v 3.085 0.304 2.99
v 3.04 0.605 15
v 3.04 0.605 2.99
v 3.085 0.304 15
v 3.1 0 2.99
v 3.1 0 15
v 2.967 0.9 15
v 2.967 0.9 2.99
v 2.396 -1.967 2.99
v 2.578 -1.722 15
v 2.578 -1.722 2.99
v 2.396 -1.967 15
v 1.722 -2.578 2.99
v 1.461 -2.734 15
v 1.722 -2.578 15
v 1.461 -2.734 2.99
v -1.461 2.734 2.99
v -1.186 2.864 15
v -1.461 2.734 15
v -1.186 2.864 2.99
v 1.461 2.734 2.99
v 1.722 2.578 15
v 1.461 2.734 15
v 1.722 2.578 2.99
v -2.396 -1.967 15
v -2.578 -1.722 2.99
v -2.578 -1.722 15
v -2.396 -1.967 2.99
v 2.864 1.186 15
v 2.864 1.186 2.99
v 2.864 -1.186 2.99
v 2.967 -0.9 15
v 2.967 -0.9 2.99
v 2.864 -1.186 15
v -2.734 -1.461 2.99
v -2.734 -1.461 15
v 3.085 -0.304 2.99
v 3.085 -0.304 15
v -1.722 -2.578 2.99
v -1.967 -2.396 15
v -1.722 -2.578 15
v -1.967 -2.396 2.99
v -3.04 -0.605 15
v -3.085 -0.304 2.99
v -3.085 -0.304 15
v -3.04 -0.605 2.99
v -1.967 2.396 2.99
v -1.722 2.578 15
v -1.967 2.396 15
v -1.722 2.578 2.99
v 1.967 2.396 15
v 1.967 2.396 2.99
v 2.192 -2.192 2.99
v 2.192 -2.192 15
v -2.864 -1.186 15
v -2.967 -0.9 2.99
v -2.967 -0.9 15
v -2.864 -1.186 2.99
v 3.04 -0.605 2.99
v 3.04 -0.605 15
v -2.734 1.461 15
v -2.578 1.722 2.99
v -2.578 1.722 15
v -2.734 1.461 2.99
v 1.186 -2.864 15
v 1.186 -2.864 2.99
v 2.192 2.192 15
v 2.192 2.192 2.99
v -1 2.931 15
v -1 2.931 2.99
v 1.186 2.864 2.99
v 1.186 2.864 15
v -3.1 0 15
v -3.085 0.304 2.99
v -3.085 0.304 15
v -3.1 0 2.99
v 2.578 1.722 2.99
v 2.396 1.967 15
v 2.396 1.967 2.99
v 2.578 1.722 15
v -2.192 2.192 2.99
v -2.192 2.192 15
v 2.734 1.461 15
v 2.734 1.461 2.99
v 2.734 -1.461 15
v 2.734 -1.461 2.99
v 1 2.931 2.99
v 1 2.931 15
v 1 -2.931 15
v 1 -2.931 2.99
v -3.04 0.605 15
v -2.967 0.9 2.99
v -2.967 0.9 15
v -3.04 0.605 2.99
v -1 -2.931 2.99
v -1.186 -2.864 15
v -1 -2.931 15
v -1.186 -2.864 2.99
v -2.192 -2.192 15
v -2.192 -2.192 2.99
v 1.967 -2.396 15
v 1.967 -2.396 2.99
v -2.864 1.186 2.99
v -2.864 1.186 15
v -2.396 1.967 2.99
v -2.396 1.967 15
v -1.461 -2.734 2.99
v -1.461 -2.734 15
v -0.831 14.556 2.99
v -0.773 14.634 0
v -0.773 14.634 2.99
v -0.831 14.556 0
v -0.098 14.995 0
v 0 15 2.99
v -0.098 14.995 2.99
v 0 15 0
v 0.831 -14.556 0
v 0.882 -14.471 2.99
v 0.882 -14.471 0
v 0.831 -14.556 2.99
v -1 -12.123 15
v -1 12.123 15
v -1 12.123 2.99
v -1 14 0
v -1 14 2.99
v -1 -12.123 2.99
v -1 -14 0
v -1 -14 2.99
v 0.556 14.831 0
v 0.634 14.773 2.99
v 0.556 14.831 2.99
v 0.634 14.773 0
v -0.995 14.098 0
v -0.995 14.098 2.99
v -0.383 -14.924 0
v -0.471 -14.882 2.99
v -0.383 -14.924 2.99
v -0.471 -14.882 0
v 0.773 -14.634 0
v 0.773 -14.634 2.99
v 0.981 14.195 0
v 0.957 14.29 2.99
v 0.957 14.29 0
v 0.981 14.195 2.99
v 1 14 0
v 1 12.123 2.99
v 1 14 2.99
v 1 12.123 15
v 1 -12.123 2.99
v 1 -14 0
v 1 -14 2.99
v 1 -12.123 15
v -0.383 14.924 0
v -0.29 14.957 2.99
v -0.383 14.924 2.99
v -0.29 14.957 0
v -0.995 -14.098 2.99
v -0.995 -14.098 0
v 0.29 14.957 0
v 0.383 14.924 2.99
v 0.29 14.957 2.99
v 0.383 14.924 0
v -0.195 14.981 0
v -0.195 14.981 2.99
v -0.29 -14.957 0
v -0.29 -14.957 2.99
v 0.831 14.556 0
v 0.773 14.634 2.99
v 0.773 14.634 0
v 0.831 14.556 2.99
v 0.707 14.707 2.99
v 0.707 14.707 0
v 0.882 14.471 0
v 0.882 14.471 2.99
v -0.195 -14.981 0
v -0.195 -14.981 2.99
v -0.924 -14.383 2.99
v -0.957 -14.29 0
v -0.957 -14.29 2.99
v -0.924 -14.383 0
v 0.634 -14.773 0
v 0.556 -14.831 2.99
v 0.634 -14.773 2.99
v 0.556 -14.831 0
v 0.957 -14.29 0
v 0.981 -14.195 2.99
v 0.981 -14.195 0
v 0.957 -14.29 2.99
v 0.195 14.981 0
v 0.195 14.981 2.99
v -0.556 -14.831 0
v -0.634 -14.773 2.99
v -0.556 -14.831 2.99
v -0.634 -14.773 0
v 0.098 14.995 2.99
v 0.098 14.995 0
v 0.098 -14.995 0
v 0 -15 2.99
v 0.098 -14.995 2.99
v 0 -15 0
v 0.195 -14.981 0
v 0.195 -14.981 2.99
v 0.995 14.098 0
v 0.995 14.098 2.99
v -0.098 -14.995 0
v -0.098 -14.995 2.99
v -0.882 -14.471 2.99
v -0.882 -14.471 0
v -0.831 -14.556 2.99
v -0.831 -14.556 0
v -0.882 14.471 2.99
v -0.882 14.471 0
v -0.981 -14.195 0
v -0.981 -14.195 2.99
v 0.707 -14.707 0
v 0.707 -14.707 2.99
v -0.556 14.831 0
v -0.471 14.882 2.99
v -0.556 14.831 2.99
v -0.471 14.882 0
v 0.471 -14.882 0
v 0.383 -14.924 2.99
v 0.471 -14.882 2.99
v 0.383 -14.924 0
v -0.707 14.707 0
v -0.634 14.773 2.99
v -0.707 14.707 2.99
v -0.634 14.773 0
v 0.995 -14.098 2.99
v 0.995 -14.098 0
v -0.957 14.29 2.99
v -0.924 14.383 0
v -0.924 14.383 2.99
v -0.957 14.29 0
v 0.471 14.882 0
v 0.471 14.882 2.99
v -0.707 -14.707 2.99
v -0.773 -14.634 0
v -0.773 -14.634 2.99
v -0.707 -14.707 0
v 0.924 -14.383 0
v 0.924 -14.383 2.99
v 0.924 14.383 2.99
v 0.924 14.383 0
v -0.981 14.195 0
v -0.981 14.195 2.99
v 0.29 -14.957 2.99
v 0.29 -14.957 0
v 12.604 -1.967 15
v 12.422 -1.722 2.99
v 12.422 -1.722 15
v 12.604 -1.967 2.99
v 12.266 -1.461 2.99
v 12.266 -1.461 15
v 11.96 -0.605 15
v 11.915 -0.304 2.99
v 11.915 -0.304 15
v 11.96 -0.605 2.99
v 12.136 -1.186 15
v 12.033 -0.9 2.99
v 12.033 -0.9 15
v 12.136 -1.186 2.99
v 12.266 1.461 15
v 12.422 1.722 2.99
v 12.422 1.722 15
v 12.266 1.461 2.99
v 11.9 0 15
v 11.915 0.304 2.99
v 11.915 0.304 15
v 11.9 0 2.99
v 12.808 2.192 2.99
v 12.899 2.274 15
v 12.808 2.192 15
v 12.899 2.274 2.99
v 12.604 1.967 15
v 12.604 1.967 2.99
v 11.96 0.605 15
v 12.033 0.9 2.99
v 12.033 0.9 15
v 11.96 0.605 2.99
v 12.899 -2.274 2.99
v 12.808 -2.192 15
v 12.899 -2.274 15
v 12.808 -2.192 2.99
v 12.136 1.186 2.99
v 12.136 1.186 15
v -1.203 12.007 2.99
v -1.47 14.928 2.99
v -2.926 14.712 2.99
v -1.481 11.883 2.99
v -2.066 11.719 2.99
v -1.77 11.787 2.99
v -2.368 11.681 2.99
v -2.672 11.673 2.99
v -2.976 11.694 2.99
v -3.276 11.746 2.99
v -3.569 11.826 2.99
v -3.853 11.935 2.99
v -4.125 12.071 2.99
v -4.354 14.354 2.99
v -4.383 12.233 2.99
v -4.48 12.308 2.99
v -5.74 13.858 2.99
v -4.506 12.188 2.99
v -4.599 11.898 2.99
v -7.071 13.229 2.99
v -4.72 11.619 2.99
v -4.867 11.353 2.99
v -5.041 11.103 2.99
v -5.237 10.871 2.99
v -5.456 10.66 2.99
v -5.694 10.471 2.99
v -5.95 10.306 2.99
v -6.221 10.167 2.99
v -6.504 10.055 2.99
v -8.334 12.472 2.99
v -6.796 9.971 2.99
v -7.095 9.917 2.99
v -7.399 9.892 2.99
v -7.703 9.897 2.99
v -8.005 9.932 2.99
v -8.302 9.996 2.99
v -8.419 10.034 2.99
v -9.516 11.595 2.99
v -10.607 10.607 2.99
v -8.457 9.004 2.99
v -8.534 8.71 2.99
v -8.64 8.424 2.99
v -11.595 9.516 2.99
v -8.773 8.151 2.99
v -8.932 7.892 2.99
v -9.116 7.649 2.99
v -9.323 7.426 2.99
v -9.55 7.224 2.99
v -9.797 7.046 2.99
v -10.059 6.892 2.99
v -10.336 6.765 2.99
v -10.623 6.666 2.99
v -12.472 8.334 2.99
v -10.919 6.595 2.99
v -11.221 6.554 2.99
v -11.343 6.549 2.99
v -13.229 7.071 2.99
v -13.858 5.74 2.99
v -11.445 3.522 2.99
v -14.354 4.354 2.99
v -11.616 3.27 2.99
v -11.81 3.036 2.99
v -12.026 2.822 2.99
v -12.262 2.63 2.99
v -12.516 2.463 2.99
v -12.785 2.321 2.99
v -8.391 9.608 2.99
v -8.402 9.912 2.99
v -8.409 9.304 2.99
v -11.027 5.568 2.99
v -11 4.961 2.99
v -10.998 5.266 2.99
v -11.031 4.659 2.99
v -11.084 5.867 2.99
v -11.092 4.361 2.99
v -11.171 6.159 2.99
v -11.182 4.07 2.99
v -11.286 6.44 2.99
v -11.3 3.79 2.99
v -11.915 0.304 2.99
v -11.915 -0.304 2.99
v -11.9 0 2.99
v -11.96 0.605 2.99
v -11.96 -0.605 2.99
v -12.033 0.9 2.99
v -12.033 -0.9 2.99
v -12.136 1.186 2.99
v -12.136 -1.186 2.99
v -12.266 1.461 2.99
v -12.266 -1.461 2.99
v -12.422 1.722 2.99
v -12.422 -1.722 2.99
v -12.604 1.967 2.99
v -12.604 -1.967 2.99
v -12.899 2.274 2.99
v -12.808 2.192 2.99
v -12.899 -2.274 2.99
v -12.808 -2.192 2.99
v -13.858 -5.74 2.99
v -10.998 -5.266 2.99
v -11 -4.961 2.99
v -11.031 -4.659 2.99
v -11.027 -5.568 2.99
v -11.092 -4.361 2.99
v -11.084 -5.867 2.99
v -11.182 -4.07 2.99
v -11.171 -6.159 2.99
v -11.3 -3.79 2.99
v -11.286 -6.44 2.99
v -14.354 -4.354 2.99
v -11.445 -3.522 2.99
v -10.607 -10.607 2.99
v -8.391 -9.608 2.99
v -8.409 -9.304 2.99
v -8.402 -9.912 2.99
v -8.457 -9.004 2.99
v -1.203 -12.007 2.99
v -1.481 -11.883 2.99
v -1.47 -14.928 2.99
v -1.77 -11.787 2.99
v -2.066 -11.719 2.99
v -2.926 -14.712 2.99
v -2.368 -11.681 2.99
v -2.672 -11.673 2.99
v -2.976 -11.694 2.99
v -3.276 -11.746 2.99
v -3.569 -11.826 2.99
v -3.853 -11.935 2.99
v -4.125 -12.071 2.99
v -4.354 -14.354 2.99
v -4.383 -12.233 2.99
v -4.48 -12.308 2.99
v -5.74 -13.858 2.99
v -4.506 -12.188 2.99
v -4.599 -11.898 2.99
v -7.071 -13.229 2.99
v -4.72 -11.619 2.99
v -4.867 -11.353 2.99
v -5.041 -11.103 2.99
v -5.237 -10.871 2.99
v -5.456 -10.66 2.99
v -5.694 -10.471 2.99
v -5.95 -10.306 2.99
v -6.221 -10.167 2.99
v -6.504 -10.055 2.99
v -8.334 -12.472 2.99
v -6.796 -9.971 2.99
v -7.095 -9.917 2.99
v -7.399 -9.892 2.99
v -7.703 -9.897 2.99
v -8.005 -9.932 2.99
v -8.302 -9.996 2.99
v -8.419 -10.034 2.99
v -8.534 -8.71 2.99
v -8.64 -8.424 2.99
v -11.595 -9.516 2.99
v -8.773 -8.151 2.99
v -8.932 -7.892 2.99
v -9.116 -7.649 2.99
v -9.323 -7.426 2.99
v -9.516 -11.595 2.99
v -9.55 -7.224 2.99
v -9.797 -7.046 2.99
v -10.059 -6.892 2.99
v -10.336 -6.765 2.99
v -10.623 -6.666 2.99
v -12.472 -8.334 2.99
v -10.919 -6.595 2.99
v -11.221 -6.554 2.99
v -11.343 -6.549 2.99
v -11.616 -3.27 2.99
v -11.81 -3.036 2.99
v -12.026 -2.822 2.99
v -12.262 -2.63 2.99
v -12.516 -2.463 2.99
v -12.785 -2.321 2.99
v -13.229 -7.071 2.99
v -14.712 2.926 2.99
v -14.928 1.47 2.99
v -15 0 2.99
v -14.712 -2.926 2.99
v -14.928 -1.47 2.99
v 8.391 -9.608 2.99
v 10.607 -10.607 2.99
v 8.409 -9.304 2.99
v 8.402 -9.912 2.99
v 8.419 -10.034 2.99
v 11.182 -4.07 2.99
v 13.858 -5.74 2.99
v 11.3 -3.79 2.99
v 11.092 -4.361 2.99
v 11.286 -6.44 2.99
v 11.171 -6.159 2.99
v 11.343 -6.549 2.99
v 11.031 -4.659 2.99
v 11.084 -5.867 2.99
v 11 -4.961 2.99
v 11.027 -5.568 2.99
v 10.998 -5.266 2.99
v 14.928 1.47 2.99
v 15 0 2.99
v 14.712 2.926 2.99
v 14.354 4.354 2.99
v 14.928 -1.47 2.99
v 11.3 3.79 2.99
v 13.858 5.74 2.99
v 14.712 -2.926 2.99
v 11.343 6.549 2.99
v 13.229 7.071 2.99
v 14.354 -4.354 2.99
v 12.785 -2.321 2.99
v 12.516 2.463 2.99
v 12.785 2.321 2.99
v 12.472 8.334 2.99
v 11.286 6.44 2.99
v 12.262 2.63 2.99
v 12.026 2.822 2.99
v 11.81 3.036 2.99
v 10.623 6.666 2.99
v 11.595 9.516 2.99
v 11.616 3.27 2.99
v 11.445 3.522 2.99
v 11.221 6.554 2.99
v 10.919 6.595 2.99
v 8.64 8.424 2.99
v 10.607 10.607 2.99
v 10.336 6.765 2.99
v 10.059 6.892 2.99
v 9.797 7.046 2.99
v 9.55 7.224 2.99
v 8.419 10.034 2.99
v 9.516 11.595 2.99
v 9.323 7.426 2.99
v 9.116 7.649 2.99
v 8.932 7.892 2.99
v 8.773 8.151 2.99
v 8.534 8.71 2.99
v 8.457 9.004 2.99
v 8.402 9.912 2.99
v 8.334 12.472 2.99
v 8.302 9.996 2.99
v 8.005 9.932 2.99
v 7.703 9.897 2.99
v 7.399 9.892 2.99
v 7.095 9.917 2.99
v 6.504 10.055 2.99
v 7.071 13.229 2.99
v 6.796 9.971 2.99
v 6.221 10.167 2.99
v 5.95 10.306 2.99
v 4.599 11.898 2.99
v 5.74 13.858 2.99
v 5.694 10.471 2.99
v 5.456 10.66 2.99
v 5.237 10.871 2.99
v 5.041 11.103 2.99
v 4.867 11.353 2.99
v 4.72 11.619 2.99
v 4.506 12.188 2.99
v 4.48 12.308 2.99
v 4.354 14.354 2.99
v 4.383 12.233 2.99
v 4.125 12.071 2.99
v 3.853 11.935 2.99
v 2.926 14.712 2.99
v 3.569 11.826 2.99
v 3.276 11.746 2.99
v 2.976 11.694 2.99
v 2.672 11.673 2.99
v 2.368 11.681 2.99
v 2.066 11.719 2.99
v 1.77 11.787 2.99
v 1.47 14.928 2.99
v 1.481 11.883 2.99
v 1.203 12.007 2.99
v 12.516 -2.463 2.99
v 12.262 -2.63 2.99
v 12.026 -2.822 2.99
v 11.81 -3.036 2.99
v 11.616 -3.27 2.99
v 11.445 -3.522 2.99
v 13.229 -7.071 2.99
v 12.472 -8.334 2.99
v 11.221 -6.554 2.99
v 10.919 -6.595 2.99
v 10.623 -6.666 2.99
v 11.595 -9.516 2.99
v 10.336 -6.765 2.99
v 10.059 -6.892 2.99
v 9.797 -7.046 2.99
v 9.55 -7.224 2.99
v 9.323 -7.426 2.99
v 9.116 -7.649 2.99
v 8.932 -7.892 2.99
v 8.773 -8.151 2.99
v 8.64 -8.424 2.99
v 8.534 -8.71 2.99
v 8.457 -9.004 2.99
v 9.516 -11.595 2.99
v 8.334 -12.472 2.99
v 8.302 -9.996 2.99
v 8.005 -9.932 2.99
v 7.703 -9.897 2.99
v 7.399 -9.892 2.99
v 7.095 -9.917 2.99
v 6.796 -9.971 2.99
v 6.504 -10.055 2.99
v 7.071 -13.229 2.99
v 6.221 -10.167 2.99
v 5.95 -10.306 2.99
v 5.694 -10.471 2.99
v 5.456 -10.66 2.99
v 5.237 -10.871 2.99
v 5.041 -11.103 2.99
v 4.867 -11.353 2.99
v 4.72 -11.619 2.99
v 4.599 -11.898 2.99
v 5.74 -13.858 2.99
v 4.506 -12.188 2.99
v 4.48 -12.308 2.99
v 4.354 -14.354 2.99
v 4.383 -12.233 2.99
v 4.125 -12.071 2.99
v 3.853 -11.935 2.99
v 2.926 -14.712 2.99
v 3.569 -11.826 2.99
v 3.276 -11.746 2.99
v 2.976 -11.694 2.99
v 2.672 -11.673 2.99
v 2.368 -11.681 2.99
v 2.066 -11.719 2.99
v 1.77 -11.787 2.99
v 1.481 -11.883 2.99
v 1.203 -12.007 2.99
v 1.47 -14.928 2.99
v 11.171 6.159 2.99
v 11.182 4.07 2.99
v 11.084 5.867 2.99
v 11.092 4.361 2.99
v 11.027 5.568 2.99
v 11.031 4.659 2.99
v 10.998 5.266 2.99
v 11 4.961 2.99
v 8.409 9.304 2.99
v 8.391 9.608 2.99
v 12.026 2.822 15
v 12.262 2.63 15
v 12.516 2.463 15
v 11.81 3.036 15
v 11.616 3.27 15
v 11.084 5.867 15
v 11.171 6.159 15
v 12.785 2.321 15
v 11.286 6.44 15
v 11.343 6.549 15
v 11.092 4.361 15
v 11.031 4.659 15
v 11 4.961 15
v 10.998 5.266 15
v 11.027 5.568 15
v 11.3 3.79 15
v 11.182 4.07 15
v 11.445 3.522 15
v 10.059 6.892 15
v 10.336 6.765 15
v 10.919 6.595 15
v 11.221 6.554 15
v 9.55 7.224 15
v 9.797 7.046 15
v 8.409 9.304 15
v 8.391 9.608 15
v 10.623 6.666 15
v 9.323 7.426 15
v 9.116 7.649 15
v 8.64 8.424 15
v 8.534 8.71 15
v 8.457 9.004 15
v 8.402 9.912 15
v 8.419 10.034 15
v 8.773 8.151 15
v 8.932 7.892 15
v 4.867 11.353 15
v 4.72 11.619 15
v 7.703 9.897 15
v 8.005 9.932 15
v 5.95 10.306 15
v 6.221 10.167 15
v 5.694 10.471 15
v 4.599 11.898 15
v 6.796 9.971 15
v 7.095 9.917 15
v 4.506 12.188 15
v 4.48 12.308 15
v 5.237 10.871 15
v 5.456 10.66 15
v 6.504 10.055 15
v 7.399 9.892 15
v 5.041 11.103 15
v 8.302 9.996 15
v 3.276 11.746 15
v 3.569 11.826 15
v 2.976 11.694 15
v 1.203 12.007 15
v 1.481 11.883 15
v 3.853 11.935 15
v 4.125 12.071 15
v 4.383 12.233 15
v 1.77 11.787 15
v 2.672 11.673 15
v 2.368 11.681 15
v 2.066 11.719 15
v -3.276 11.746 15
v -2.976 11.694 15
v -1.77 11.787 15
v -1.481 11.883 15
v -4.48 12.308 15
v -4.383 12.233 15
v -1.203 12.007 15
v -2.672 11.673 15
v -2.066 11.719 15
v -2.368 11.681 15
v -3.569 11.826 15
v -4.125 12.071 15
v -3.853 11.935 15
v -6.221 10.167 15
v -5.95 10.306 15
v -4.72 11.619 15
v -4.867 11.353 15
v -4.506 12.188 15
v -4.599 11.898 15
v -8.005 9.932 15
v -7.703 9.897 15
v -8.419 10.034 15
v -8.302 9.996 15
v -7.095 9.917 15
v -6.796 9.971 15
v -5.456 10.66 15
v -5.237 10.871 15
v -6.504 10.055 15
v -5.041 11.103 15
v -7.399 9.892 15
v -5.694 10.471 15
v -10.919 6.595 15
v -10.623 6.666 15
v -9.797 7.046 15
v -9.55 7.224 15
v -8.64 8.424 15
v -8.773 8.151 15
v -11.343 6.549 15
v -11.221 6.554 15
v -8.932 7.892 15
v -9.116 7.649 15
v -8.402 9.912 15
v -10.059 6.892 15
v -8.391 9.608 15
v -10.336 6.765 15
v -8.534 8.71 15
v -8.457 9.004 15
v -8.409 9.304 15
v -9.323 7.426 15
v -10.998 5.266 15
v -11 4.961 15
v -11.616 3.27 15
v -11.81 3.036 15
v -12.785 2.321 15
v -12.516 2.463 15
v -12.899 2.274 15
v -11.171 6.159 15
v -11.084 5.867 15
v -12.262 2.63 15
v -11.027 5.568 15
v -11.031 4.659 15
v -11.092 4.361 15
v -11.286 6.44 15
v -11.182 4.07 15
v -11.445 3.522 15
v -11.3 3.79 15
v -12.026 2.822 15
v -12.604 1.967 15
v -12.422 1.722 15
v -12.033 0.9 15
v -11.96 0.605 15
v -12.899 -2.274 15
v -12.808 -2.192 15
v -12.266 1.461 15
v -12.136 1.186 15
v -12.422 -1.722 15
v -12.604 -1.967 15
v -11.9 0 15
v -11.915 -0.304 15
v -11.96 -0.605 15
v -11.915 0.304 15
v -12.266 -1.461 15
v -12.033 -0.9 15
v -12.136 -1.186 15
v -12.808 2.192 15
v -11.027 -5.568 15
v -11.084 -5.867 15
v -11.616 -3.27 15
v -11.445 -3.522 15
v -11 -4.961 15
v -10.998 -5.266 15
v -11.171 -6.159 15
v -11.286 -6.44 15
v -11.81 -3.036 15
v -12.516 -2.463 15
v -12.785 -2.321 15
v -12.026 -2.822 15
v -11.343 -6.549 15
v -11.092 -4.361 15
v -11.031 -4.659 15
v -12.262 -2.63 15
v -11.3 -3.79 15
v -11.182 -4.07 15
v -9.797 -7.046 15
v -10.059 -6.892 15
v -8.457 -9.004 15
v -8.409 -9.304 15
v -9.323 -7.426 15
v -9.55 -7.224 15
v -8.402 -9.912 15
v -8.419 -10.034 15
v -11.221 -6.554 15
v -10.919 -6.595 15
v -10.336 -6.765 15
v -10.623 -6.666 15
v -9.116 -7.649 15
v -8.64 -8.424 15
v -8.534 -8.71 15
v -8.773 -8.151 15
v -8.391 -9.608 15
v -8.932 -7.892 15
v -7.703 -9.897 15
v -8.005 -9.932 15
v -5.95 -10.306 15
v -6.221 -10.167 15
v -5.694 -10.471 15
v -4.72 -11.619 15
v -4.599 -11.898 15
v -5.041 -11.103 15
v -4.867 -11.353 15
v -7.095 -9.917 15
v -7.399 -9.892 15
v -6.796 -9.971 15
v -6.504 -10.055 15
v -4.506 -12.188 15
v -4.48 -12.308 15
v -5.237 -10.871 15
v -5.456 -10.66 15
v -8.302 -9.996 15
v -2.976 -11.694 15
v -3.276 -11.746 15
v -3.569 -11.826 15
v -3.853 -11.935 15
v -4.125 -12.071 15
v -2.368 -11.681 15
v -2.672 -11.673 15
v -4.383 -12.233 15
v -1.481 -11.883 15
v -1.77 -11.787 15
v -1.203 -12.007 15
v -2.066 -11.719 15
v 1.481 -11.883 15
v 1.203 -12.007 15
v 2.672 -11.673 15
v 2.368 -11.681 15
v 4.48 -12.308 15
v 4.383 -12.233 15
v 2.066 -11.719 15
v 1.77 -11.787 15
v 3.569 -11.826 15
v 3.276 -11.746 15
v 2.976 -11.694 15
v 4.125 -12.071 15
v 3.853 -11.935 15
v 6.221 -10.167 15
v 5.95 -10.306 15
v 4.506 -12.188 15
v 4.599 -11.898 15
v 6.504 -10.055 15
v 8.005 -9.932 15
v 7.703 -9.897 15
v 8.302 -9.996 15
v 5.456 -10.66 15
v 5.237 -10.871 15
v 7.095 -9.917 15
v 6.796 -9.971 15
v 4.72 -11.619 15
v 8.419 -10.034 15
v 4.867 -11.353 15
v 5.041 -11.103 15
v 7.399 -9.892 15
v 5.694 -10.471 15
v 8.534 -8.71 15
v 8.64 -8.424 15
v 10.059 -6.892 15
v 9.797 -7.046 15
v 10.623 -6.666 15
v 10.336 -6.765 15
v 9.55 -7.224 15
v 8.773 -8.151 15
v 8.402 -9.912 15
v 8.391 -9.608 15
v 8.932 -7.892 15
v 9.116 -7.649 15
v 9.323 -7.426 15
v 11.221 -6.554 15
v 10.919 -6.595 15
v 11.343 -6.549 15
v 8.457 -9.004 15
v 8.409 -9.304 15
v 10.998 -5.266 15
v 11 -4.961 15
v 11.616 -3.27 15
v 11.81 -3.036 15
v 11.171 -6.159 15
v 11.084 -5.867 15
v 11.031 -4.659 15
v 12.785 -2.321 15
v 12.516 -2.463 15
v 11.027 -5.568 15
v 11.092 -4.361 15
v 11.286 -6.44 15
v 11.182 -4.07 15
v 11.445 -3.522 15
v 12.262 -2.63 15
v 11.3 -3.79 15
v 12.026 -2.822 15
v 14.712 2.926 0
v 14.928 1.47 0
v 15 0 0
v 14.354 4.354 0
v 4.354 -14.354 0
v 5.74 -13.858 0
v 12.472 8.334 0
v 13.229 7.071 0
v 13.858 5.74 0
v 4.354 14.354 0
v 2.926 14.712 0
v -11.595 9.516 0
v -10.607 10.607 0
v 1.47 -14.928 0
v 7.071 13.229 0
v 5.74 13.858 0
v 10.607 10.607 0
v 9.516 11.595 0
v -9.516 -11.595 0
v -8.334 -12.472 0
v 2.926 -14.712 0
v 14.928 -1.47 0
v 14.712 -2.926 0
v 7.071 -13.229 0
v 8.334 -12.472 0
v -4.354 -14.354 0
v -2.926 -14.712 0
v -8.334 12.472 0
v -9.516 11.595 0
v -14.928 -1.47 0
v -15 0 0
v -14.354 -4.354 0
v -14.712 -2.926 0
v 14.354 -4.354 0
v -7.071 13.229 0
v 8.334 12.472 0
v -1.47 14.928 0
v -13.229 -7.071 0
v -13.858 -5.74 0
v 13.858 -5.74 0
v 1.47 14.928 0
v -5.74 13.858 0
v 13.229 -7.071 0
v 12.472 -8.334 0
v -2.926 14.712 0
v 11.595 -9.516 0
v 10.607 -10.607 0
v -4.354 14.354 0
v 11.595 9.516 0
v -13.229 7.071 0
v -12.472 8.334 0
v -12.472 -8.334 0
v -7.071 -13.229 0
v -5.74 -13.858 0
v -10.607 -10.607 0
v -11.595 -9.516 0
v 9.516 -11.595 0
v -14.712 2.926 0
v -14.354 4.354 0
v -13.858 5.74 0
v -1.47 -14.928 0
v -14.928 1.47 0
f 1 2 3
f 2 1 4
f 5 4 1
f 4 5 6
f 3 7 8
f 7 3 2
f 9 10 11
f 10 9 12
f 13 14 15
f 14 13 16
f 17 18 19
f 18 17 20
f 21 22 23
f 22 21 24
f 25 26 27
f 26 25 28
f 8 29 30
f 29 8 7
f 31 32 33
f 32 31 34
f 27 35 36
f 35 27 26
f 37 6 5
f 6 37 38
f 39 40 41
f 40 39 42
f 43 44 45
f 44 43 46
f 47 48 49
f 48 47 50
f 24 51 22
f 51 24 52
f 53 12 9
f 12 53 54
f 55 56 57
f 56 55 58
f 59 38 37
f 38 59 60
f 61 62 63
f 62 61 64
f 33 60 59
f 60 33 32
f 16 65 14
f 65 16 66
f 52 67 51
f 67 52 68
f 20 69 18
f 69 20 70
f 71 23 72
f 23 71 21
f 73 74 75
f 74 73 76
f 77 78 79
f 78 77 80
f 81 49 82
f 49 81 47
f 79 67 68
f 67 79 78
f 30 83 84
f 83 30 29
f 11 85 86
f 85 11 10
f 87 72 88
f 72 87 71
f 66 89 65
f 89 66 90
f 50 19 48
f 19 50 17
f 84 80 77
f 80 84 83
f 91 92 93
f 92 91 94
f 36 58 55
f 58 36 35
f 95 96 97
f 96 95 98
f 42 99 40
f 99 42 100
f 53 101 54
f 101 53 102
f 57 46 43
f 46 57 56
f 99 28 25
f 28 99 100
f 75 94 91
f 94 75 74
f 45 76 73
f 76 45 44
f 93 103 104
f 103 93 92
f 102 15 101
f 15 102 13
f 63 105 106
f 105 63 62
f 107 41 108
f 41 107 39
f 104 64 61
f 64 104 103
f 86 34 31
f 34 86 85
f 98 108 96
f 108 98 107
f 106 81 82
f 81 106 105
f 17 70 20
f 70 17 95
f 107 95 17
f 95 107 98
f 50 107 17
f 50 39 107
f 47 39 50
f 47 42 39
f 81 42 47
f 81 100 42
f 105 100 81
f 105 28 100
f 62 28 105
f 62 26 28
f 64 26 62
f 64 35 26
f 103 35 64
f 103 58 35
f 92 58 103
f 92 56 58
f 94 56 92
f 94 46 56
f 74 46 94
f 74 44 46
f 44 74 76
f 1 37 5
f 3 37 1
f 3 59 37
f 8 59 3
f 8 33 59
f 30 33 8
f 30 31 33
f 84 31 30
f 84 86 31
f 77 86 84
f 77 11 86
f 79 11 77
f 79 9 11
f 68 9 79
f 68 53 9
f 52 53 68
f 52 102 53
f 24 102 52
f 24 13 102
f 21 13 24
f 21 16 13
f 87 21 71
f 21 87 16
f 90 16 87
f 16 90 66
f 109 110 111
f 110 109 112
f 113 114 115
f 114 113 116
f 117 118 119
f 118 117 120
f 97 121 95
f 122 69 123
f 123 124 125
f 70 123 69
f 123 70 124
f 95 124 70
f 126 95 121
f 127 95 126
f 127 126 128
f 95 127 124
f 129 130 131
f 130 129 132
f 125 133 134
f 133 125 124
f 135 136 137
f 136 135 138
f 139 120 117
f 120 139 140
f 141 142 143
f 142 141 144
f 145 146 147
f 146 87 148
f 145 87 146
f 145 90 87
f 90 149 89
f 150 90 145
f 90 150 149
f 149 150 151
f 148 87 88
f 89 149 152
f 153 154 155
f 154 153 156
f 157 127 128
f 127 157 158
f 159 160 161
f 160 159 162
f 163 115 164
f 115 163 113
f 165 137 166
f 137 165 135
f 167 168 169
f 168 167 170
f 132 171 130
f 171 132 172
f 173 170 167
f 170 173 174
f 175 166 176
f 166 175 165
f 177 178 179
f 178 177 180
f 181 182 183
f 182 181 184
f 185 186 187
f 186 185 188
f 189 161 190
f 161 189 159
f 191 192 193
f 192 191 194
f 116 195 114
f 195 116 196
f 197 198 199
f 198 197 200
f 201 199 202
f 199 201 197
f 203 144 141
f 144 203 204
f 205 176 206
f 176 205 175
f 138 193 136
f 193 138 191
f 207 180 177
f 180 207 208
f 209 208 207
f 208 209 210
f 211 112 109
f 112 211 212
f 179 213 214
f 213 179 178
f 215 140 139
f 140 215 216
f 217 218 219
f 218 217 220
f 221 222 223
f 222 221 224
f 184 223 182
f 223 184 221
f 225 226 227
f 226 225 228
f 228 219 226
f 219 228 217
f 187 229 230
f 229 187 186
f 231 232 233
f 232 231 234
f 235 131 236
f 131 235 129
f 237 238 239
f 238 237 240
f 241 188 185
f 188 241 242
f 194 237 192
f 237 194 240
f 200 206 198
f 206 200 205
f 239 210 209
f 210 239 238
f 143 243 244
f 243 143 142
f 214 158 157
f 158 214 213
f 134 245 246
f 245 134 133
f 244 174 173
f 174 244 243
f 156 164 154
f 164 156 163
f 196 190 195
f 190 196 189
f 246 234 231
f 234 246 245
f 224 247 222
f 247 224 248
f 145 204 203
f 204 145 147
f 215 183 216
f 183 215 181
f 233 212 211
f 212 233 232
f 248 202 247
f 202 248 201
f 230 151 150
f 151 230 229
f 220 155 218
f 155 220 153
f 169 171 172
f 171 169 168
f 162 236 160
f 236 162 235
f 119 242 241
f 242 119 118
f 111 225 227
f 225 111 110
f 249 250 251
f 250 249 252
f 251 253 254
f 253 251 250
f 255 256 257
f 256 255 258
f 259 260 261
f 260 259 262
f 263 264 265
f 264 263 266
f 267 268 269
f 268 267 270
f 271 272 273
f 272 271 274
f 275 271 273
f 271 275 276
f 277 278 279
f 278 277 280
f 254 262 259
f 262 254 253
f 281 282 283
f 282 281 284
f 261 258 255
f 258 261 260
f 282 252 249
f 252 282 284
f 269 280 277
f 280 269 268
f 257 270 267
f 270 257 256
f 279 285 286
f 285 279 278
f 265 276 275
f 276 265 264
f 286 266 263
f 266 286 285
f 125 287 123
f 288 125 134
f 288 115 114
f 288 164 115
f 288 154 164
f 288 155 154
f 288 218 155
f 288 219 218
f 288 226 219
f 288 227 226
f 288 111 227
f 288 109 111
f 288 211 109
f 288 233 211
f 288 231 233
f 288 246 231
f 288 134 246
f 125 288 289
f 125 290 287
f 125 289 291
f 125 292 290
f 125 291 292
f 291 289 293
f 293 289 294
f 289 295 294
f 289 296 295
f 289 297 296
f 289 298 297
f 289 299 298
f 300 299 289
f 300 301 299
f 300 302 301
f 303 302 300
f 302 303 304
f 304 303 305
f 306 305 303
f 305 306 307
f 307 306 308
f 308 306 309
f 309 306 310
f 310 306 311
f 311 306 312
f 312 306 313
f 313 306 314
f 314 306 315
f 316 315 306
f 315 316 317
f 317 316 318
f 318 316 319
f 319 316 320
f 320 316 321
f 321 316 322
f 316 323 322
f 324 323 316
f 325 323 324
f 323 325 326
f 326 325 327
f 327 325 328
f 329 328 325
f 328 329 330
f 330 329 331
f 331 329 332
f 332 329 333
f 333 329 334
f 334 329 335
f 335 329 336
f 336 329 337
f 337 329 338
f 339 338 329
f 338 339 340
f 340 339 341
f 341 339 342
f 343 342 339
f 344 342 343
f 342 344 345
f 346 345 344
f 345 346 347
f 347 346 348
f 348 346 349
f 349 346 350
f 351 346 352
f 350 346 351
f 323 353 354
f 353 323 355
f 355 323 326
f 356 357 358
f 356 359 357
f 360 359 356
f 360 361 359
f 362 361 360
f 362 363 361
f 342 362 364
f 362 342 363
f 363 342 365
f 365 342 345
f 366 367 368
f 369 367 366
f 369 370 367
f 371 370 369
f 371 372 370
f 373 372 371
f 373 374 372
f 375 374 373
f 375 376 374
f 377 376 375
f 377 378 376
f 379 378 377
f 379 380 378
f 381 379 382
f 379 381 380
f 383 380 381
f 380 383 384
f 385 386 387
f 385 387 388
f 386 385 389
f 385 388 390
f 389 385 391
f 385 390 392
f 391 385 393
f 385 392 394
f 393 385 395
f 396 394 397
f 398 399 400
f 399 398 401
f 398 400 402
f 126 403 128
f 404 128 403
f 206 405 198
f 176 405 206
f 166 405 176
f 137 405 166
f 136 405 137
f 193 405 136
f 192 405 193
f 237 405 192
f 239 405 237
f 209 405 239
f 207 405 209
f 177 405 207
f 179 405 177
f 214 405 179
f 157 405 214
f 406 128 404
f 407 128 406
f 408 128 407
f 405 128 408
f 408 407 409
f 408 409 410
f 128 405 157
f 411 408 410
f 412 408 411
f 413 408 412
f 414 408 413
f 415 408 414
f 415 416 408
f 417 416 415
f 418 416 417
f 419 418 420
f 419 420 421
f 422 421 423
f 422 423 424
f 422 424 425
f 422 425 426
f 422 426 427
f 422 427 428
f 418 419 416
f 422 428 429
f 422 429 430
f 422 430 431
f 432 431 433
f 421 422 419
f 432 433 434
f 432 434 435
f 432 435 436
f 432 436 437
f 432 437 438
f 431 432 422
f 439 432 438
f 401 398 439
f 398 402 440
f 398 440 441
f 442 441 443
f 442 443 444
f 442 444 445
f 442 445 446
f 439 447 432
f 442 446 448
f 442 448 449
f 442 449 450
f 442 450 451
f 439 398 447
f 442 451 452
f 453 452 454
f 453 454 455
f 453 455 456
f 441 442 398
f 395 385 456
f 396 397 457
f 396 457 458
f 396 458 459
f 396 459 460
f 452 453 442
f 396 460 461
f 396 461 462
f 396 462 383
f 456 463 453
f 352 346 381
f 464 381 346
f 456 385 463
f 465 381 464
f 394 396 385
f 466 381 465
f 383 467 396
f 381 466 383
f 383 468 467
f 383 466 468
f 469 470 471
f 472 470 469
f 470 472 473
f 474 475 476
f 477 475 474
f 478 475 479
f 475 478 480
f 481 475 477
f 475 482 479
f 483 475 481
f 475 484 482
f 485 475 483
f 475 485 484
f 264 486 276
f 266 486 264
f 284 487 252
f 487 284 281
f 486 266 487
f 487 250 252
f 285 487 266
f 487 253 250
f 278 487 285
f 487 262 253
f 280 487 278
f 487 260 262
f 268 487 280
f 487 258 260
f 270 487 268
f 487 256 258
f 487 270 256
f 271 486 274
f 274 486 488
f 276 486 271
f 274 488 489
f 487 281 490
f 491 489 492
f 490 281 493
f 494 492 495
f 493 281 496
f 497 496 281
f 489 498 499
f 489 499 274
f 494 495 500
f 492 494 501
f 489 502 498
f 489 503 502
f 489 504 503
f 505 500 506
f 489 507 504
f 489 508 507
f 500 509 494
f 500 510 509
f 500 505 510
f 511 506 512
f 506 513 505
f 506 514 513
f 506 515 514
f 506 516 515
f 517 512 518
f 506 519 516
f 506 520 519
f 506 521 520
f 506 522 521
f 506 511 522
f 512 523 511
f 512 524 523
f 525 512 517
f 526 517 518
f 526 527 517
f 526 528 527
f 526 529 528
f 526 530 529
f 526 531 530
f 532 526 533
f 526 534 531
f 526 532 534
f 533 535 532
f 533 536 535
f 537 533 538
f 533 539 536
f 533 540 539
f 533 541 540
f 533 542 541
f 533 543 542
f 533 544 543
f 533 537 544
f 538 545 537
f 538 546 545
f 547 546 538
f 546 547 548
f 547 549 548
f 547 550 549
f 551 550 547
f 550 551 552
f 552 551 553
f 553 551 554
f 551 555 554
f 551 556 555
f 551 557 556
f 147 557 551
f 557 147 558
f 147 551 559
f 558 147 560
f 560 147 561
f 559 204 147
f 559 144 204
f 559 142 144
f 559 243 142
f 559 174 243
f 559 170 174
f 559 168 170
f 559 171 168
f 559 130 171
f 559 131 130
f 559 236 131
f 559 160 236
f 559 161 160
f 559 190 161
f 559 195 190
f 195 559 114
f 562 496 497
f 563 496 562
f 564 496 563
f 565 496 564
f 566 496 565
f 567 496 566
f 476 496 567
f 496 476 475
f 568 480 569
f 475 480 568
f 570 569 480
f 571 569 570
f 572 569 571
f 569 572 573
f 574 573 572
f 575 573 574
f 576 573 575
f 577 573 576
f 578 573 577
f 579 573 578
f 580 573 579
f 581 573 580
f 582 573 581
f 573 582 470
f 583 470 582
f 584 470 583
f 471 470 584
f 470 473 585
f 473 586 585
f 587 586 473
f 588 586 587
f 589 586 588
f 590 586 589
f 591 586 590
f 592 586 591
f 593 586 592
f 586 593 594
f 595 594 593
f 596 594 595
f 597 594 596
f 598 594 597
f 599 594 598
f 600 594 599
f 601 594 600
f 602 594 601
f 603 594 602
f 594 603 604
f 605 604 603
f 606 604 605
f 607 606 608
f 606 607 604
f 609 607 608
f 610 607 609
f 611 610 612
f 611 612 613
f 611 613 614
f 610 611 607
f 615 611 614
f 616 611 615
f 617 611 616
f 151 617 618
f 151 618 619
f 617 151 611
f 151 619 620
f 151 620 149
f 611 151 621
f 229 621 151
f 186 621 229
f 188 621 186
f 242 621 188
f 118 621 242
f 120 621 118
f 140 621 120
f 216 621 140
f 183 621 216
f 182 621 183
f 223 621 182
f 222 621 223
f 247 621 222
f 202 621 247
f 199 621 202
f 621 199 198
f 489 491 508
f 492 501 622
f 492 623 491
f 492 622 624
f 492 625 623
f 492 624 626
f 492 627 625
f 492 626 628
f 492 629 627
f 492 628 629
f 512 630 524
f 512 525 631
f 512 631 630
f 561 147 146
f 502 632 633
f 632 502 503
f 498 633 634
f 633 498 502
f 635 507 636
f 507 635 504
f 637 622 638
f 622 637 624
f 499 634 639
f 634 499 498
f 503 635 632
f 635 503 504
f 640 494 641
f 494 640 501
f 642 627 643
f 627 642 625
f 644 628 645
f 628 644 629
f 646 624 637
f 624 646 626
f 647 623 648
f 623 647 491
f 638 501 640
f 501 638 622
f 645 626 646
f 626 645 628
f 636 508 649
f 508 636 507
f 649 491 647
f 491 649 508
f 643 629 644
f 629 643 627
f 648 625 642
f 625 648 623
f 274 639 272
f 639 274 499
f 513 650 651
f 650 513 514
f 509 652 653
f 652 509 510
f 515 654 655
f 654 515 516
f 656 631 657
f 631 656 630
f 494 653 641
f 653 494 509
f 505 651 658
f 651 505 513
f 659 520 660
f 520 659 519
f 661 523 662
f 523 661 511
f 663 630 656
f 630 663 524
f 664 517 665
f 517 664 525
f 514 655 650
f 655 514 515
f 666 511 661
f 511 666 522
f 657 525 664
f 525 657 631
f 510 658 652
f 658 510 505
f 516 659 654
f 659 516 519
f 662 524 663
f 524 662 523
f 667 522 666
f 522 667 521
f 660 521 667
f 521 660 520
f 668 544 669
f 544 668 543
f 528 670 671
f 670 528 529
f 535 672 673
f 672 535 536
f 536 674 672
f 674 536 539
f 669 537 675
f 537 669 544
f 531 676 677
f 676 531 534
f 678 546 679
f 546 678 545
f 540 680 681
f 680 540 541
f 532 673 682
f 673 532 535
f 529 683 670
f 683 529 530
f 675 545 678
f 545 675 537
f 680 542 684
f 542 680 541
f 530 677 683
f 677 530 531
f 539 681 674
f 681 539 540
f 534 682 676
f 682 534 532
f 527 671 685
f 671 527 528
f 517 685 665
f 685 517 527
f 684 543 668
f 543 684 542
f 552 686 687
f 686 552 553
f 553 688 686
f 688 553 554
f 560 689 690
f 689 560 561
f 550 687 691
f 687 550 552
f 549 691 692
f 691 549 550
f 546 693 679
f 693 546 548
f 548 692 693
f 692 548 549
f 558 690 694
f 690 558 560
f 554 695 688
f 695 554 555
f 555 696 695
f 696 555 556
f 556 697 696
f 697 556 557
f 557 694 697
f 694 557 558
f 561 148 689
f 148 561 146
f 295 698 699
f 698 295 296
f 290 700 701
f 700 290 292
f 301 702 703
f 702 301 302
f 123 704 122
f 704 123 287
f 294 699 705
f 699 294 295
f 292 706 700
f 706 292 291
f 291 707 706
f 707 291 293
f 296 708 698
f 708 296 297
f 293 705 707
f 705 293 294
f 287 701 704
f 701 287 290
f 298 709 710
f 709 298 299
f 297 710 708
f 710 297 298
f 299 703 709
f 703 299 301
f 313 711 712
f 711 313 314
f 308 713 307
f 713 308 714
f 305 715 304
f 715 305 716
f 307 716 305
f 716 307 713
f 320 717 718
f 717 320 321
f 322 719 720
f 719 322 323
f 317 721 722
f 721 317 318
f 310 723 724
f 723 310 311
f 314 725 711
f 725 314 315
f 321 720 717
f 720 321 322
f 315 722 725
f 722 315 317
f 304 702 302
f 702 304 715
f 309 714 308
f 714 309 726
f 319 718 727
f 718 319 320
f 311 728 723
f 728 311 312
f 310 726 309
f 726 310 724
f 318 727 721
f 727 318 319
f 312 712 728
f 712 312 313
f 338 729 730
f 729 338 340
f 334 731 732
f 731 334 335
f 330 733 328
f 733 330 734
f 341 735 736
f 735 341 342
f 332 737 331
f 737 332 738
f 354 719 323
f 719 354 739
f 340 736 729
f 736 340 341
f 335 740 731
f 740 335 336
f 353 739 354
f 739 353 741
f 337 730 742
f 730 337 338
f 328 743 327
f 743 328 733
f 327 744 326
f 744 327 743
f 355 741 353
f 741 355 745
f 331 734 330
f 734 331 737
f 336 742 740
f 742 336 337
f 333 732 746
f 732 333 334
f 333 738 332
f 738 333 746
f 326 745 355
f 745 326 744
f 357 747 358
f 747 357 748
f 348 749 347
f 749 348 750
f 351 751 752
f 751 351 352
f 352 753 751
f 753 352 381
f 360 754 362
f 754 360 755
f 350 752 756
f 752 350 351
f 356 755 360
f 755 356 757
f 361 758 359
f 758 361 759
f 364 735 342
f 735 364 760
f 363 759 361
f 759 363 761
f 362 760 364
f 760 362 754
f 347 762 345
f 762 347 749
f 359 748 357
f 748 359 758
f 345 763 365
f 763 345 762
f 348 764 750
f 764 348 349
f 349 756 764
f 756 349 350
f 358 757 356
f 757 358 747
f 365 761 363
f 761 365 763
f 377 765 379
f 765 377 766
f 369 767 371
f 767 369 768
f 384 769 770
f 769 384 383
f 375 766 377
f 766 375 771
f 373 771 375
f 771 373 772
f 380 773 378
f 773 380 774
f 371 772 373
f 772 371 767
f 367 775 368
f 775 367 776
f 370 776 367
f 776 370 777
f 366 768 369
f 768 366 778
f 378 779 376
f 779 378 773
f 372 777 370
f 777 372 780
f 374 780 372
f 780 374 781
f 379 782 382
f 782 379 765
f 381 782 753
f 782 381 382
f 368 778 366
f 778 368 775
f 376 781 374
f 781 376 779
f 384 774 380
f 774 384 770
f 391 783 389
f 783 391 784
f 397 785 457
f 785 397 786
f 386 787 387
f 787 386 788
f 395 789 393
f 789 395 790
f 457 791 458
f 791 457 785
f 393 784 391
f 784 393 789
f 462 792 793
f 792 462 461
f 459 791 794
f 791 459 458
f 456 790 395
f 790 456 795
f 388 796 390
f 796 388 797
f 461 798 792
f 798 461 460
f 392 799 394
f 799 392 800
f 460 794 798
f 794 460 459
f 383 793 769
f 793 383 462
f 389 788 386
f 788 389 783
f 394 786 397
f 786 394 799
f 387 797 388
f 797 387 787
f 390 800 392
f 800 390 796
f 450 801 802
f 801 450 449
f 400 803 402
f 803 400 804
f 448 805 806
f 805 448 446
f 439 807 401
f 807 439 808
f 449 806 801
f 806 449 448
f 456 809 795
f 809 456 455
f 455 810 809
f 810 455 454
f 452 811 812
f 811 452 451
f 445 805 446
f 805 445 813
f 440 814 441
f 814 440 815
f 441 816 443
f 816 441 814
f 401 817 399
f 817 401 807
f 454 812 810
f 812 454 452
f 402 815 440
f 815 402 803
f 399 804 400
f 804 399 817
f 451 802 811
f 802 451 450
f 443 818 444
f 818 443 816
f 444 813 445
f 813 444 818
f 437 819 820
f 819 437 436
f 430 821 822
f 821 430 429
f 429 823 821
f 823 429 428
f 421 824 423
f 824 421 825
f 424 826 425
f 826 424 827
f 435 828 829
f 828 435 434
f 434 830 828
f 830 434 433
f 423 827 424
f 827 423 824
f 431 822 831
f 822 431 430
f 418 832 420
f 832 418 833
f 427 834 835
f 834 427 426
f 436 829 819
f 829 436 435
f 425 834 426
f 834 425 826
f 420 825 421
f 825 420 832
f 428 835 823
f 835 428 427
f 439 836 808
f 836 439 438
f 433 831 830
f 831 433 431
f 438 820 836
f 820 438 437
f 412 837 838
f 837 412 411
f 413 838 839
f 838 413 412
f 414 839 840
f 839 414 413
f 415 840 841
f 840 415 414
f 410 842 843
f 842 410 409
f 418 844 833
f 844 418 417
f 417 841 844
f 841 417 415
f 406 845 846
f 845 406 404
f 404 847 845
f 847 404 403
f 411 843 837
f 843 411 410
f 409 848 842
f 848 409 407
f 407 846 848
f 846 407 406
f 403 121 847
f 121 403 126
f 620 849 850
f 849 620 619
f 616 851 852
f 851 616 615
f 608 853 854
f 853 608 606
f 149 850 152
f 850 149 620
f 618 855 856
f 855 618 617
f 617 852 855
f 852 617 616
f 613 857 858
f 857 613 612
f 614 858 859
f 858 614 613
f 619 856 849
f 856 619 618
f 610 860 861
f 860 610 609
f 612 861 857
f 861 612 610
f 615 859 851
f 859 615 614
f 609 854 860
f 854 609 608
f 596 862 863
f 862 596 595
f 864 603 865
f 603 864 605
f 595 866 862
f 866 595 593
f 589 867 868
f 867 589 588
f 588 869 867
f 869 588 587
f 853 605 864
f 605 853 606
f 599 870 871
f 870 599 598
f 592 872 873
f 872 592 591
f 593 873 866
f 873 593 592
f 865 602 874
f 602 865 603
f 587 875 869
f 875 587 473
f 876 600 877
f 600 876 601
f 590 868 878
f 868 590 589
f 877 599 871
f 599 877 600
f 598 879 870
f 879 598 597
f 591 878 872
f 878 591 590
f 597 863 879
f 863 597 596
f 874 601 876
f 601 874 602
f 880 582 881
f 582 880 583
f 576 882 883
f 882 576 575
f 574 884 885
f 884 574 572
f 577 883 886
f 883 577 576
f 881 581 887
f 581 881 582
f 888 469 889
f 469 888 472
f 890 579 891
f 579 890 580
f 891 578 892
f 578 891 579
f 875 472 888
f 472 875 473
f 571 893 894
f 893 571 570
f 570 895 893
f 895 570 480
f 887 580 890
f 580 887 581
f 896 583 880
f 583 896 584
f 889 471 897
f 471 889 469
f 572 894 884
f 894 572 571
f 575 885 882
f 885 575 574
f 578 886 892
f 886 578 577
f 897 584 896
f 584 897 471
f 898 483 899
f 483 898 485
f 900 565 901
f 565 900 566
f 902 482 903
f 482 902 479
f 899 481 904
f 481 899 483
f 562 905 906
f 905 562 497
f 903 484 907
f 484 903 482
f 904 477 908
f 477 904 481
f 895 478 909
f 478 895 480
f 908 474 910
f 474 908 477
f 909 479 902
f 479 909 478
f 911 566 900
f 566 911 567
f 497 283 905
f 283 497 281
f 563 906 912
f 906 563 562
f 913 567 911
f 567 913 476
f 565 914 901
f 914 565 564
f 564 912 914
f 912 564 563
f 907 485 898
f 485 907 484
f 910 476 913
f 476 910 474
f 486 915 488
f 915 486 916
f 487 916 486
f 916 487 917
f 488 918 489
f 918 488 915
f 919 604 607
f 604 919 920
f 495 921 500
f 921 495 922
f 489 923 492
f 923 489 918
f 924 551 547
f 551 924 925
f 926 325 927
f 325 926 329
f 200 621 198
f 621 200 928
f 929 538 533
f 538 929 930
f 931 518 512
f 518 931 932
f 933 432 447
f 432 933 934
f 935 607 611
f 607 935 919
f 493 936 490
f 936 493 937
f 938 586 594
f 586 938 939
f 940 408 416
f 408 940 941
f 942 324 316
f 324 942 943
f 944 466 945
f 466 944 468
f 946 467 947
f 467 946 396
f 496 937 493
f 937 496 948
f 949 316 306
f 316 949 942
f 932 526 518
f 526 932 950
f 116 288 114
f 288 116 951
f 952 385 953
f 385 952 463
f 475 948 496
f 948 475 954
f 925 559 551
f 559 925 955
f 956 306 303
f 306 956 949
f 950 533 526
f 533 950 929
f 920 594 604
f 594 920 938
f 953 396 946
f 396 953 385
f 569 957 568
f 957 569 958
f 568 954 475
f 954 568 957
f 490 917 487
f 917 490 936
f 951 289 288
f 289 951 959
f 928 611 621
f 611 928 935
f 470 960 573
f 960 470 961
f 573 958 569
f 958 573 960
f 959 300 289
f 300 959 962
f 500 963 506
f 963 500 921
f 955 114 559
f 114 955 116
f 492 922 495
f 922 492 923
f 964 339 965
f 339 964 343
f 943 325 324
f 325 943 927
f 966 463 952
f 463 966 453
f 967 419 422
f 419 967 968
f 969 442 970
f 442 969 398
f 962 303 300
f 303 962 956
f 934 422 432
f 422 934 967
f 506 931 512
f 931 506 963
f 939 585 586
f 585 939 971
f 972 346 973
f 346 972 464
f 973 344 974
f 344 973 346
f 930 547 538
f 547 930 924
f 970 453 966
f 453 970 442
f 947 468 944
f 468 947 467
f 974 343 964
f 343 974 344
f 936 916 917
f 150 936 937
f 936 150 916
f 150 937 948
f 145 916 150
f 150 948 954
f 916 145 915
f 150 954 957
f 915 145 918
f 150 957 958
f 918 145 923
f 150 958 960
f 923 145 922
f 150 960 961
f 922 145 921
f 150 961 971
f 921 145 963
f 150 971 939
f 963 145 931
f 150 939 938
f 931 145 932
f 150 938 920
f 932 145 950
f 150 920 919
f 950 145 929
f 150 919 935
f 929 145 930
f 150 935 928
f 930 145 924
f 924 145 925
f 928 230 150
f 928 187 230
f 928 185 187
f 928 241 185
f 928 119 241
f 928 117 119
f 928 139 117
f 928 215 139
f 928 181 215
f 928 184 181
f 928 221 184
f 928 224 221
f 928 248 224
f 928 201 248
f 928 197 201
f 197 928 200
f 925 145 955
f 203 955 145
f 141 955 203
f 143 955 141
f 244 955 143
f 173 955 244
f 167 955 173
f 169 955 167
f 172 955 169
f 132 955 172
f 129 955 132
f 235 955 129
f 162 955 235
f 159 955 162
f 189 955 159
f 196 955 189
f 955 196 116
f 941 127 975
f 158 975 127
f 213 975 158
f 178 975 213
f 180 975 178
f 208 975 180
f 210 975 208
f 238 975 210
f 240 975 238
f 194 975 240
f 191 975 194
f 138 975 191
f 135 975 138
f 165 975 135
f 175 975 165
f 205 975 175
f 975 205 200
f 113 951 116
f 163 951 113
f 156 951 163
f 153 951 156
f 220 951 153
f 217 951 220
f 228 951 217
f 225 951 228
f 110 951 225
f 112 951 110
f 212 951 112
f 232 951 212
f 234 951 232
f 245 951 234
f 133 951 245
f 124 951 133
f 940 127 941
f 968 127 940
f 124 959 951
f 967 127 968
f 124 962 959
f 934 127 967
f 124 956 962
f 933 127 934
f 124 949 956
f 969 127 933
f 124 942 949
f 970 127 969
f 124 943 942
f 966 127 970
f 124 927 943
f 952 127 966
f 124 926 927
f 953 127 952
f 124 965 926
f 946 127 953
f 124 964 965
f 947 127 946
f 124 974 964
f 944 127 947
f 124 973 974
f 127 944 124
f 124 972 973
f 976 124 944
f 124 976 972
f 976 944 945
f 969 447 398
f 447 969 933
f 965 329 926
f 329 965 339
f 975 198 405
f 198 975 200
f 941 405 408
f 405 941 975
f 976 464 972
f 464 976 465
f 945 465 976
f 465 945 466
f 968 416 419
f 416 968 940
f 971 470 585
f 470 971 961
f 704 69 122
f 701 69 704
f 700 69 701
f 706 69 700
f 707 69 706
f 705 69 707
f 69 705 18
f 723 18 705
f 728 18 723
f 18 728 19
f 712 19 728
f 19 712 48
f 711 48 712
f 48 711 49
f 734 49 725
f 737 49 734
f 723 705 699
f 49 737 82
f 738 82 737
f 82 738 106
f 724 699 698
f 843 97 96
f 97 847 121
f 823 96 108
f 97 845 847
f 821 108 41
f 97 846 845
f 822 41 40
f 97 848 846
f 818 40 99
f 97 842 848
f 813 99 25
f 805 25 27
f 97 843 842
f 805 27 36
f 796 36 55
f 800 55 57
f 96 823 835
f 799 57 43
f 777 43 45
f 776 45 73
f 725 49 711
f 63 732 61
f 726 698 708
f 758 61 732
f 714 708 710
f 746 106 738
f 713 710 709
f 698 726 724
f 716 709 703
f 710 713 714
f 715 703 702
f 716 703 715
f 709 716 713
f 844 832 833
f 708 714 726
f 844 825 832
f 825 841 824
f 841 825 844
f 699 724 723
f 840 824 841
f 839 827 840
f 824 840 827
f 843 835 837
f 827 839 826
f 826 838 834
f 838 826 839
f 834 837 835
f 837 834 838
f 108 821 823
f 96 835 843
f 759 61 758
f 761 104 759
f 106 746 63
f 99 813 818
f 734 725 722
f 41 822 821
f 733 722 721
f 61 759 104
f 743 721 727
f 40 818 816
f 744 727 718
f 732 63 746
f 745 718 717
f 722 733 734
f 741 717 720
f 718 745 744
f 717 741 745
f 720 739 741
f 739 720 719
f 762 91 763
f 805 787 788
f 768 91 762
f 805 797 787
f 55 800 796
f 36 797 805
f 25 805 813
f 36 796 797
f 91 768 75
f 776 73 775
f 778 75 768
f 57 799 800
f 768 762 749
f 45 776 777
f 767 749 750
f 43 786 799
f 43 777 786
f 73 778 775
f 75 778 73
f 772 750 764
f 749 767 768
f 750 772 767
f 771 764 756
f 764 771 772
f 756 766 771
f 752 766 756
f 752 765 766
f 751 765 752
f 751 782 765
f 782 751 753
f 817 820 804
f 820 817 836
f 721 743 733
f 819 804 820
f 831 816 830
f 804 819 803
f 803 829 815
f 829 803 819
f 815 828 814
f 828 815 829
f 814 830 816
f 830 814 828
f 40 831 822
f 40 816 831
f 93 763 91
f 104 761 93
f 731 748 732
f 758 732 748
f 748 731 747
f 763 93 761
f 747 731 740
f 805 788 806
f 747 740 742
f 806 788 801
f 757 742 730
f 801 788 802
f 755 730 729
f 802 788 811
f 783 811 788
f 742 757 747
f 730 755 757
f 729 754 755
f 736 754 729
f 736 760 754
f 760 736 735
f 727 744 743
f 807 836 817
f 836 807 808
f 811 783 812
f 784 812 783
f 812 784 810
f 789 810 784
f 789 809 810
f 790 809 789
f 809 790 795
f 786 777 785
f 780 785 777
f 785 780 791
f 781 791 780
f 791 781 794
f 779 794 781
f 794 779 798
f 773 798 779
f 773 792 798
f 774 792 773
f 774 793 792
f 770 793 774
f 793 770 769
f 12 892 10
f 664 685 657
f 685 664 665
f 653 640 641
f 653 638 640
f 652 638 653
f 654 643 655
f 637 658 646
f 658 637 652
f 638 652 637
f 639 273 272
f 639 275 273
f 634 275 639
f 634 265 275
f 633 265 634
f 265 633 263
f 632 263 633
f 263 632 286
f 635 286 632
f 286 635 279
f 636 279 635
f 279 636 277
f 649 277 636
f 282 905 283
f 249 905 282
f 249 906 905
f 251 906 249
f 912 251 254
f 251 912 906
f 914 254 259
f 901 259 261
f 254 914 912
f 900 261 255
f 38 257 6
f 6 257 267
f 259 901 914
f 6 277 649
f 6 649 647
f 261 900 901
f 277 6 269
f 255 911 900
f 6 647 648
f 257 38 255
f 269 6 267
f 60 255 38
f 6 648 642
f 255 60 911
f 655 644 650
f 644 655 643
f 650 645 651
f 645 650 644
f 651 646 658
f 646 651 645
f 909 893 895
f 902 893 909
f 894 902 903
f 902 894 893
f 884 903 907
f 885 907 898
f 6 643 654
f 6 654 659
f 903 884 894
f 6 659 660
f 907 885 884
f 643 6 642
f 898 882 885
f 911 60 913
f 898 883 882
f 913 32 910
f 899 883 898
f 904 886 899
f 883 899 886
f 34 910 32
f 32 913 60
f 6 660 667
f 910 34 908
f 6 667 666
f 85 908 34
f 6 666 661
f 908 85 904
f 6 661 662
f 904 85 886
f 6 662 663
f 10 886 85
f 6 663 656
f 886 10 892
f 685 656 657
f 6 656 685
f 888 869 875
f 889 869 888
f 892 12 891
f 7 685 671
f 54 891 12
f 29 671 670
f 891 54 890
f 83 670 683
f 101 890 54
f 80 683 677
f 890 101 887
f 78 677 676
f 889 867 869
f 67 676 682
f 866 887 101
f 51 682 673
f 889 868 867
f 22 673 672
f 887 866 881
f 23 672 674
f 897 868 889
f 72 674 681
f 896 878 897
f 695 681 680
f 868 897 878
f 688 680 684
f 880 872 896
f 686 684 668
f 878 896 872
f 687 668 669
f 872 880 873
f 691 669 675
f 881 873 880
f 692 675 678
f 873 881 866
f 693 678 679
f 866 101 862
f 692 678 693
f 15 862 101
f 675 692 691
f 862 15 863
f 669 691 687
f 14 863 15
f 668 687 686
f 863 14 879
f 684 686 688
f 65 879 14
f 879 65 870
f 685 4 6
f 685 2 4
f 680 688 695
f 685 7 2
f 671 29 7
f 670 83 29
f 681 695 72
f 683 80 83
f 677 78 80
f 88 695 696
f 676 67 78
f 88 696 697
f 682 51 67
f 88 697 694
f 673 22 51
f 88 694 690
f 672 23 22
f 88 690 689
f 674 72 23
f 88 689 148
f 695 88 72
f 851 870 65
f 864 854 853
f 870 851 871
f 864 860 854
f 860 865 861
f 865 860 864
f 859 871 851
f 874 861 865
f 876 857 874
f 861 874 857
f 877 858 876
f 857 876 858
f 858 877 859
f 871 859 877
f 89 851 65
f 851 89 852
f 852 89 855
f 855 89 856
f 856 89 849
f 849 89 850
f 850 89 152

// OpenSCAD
// Built by bench/smallmodels/features/compiler.py from a list of features.
$fn = 64;
difference() {
  union() {
    translate([0, 0, 0]) cylinder(d = 30, h = 15);
  }
  union() {
    translate([0, 0, 2.99]) rotate([0, 0, 0]) cylinder(d = 6.2, h = 12.02);
    translate([0, 0, -0.01]) rotate([0, 0, 90]) hull() { for (s = [-1, 1]) translate([s * 14, 0, 0]) cylinder(d = 2, h = 15.02); }
    translate([15, 0, 2.99]) rotate([0, 0, 0]) cylinder(d = 6.2, h = 12.02);
    translate([14.0954, 5.1303, 2.99]) rotate([0, 0, 20]) cylinder(d = 6.2, h = 12.02);
    translate([11.4907, 9.6418, 2.99]) rotate([0, 0, 40]) cylinder(d = 6.2, h = 12.02);
    translate([7.5, 12.9904, 2.99]) rotate([0, 0, 60]) cylinder(d = 6.2, h = 12.02);
    translate([2.6047, 14.7721, 2.99]) rotate([0, 0, 80]) cylinder(d = 6.2, h = 12.02);
    translate([-2.6047, 14.7721, 2.99]) rotate([0, 0, 100]) cylinder(d = 6.2, h = 12.02);
    translate([-7.5, 12.9904, 2.99]) rotate([0, 0, 120]) cylinder(d = 6.2, h = 12.02);
    translate([-11.4907, 9.6418, 2.99]) rotate([0, 0, 140]) cylinder(d = 6.2, h = 12.02);
    translate([-14.0954, 5.1303, 2.99]) rotate([0, 0, 160]) cylinder(d = 6.2, h = 12.02);
    translate([-15, 0, 2.99]) rotate([0, 0, 180]) cylinder(d = 6.2, h = 12.02);
    translate([-14.0954, -5.1303, 2.99]) rotate([0, 0, 200]) cylinder(d = 6.2, h = 12.02);
    translate([-11.4907, -9.6418, 2.99]) rotate([0, 0, 220]) cylinder(d = 6.2, h = 12.02);
    translate([-7.5, -12.9904, 2.99]) rotate([0, 0, 240]) cylinder(d = 6.2, h = 12.02);
    translate([-2.6047, -14.7721, 2.99]) rotate([0, 0, 260]) cylinder(d = 6.2, h = 12.02);
    translate([2.6047, -14.7721, 2.99]) rotate([0, 0, 280]) cylinder(d = 6.2, h = 12.02);
    translate([7.5, -12.9904, 2.99]) rotate([0, 0, 300]) cylinder(d = 6.2, h = 12.02);
    translate([11.4907, -9.6418, 2.99]) rotate([0, 0, 320]) cylinder(d = 6.2, h = 12.02);
    translate([14.0954, -5.1303, 2.99]) rotate([0, 0, 340]) cylinder(d = 6.2, h = 12.02);
  }
}
